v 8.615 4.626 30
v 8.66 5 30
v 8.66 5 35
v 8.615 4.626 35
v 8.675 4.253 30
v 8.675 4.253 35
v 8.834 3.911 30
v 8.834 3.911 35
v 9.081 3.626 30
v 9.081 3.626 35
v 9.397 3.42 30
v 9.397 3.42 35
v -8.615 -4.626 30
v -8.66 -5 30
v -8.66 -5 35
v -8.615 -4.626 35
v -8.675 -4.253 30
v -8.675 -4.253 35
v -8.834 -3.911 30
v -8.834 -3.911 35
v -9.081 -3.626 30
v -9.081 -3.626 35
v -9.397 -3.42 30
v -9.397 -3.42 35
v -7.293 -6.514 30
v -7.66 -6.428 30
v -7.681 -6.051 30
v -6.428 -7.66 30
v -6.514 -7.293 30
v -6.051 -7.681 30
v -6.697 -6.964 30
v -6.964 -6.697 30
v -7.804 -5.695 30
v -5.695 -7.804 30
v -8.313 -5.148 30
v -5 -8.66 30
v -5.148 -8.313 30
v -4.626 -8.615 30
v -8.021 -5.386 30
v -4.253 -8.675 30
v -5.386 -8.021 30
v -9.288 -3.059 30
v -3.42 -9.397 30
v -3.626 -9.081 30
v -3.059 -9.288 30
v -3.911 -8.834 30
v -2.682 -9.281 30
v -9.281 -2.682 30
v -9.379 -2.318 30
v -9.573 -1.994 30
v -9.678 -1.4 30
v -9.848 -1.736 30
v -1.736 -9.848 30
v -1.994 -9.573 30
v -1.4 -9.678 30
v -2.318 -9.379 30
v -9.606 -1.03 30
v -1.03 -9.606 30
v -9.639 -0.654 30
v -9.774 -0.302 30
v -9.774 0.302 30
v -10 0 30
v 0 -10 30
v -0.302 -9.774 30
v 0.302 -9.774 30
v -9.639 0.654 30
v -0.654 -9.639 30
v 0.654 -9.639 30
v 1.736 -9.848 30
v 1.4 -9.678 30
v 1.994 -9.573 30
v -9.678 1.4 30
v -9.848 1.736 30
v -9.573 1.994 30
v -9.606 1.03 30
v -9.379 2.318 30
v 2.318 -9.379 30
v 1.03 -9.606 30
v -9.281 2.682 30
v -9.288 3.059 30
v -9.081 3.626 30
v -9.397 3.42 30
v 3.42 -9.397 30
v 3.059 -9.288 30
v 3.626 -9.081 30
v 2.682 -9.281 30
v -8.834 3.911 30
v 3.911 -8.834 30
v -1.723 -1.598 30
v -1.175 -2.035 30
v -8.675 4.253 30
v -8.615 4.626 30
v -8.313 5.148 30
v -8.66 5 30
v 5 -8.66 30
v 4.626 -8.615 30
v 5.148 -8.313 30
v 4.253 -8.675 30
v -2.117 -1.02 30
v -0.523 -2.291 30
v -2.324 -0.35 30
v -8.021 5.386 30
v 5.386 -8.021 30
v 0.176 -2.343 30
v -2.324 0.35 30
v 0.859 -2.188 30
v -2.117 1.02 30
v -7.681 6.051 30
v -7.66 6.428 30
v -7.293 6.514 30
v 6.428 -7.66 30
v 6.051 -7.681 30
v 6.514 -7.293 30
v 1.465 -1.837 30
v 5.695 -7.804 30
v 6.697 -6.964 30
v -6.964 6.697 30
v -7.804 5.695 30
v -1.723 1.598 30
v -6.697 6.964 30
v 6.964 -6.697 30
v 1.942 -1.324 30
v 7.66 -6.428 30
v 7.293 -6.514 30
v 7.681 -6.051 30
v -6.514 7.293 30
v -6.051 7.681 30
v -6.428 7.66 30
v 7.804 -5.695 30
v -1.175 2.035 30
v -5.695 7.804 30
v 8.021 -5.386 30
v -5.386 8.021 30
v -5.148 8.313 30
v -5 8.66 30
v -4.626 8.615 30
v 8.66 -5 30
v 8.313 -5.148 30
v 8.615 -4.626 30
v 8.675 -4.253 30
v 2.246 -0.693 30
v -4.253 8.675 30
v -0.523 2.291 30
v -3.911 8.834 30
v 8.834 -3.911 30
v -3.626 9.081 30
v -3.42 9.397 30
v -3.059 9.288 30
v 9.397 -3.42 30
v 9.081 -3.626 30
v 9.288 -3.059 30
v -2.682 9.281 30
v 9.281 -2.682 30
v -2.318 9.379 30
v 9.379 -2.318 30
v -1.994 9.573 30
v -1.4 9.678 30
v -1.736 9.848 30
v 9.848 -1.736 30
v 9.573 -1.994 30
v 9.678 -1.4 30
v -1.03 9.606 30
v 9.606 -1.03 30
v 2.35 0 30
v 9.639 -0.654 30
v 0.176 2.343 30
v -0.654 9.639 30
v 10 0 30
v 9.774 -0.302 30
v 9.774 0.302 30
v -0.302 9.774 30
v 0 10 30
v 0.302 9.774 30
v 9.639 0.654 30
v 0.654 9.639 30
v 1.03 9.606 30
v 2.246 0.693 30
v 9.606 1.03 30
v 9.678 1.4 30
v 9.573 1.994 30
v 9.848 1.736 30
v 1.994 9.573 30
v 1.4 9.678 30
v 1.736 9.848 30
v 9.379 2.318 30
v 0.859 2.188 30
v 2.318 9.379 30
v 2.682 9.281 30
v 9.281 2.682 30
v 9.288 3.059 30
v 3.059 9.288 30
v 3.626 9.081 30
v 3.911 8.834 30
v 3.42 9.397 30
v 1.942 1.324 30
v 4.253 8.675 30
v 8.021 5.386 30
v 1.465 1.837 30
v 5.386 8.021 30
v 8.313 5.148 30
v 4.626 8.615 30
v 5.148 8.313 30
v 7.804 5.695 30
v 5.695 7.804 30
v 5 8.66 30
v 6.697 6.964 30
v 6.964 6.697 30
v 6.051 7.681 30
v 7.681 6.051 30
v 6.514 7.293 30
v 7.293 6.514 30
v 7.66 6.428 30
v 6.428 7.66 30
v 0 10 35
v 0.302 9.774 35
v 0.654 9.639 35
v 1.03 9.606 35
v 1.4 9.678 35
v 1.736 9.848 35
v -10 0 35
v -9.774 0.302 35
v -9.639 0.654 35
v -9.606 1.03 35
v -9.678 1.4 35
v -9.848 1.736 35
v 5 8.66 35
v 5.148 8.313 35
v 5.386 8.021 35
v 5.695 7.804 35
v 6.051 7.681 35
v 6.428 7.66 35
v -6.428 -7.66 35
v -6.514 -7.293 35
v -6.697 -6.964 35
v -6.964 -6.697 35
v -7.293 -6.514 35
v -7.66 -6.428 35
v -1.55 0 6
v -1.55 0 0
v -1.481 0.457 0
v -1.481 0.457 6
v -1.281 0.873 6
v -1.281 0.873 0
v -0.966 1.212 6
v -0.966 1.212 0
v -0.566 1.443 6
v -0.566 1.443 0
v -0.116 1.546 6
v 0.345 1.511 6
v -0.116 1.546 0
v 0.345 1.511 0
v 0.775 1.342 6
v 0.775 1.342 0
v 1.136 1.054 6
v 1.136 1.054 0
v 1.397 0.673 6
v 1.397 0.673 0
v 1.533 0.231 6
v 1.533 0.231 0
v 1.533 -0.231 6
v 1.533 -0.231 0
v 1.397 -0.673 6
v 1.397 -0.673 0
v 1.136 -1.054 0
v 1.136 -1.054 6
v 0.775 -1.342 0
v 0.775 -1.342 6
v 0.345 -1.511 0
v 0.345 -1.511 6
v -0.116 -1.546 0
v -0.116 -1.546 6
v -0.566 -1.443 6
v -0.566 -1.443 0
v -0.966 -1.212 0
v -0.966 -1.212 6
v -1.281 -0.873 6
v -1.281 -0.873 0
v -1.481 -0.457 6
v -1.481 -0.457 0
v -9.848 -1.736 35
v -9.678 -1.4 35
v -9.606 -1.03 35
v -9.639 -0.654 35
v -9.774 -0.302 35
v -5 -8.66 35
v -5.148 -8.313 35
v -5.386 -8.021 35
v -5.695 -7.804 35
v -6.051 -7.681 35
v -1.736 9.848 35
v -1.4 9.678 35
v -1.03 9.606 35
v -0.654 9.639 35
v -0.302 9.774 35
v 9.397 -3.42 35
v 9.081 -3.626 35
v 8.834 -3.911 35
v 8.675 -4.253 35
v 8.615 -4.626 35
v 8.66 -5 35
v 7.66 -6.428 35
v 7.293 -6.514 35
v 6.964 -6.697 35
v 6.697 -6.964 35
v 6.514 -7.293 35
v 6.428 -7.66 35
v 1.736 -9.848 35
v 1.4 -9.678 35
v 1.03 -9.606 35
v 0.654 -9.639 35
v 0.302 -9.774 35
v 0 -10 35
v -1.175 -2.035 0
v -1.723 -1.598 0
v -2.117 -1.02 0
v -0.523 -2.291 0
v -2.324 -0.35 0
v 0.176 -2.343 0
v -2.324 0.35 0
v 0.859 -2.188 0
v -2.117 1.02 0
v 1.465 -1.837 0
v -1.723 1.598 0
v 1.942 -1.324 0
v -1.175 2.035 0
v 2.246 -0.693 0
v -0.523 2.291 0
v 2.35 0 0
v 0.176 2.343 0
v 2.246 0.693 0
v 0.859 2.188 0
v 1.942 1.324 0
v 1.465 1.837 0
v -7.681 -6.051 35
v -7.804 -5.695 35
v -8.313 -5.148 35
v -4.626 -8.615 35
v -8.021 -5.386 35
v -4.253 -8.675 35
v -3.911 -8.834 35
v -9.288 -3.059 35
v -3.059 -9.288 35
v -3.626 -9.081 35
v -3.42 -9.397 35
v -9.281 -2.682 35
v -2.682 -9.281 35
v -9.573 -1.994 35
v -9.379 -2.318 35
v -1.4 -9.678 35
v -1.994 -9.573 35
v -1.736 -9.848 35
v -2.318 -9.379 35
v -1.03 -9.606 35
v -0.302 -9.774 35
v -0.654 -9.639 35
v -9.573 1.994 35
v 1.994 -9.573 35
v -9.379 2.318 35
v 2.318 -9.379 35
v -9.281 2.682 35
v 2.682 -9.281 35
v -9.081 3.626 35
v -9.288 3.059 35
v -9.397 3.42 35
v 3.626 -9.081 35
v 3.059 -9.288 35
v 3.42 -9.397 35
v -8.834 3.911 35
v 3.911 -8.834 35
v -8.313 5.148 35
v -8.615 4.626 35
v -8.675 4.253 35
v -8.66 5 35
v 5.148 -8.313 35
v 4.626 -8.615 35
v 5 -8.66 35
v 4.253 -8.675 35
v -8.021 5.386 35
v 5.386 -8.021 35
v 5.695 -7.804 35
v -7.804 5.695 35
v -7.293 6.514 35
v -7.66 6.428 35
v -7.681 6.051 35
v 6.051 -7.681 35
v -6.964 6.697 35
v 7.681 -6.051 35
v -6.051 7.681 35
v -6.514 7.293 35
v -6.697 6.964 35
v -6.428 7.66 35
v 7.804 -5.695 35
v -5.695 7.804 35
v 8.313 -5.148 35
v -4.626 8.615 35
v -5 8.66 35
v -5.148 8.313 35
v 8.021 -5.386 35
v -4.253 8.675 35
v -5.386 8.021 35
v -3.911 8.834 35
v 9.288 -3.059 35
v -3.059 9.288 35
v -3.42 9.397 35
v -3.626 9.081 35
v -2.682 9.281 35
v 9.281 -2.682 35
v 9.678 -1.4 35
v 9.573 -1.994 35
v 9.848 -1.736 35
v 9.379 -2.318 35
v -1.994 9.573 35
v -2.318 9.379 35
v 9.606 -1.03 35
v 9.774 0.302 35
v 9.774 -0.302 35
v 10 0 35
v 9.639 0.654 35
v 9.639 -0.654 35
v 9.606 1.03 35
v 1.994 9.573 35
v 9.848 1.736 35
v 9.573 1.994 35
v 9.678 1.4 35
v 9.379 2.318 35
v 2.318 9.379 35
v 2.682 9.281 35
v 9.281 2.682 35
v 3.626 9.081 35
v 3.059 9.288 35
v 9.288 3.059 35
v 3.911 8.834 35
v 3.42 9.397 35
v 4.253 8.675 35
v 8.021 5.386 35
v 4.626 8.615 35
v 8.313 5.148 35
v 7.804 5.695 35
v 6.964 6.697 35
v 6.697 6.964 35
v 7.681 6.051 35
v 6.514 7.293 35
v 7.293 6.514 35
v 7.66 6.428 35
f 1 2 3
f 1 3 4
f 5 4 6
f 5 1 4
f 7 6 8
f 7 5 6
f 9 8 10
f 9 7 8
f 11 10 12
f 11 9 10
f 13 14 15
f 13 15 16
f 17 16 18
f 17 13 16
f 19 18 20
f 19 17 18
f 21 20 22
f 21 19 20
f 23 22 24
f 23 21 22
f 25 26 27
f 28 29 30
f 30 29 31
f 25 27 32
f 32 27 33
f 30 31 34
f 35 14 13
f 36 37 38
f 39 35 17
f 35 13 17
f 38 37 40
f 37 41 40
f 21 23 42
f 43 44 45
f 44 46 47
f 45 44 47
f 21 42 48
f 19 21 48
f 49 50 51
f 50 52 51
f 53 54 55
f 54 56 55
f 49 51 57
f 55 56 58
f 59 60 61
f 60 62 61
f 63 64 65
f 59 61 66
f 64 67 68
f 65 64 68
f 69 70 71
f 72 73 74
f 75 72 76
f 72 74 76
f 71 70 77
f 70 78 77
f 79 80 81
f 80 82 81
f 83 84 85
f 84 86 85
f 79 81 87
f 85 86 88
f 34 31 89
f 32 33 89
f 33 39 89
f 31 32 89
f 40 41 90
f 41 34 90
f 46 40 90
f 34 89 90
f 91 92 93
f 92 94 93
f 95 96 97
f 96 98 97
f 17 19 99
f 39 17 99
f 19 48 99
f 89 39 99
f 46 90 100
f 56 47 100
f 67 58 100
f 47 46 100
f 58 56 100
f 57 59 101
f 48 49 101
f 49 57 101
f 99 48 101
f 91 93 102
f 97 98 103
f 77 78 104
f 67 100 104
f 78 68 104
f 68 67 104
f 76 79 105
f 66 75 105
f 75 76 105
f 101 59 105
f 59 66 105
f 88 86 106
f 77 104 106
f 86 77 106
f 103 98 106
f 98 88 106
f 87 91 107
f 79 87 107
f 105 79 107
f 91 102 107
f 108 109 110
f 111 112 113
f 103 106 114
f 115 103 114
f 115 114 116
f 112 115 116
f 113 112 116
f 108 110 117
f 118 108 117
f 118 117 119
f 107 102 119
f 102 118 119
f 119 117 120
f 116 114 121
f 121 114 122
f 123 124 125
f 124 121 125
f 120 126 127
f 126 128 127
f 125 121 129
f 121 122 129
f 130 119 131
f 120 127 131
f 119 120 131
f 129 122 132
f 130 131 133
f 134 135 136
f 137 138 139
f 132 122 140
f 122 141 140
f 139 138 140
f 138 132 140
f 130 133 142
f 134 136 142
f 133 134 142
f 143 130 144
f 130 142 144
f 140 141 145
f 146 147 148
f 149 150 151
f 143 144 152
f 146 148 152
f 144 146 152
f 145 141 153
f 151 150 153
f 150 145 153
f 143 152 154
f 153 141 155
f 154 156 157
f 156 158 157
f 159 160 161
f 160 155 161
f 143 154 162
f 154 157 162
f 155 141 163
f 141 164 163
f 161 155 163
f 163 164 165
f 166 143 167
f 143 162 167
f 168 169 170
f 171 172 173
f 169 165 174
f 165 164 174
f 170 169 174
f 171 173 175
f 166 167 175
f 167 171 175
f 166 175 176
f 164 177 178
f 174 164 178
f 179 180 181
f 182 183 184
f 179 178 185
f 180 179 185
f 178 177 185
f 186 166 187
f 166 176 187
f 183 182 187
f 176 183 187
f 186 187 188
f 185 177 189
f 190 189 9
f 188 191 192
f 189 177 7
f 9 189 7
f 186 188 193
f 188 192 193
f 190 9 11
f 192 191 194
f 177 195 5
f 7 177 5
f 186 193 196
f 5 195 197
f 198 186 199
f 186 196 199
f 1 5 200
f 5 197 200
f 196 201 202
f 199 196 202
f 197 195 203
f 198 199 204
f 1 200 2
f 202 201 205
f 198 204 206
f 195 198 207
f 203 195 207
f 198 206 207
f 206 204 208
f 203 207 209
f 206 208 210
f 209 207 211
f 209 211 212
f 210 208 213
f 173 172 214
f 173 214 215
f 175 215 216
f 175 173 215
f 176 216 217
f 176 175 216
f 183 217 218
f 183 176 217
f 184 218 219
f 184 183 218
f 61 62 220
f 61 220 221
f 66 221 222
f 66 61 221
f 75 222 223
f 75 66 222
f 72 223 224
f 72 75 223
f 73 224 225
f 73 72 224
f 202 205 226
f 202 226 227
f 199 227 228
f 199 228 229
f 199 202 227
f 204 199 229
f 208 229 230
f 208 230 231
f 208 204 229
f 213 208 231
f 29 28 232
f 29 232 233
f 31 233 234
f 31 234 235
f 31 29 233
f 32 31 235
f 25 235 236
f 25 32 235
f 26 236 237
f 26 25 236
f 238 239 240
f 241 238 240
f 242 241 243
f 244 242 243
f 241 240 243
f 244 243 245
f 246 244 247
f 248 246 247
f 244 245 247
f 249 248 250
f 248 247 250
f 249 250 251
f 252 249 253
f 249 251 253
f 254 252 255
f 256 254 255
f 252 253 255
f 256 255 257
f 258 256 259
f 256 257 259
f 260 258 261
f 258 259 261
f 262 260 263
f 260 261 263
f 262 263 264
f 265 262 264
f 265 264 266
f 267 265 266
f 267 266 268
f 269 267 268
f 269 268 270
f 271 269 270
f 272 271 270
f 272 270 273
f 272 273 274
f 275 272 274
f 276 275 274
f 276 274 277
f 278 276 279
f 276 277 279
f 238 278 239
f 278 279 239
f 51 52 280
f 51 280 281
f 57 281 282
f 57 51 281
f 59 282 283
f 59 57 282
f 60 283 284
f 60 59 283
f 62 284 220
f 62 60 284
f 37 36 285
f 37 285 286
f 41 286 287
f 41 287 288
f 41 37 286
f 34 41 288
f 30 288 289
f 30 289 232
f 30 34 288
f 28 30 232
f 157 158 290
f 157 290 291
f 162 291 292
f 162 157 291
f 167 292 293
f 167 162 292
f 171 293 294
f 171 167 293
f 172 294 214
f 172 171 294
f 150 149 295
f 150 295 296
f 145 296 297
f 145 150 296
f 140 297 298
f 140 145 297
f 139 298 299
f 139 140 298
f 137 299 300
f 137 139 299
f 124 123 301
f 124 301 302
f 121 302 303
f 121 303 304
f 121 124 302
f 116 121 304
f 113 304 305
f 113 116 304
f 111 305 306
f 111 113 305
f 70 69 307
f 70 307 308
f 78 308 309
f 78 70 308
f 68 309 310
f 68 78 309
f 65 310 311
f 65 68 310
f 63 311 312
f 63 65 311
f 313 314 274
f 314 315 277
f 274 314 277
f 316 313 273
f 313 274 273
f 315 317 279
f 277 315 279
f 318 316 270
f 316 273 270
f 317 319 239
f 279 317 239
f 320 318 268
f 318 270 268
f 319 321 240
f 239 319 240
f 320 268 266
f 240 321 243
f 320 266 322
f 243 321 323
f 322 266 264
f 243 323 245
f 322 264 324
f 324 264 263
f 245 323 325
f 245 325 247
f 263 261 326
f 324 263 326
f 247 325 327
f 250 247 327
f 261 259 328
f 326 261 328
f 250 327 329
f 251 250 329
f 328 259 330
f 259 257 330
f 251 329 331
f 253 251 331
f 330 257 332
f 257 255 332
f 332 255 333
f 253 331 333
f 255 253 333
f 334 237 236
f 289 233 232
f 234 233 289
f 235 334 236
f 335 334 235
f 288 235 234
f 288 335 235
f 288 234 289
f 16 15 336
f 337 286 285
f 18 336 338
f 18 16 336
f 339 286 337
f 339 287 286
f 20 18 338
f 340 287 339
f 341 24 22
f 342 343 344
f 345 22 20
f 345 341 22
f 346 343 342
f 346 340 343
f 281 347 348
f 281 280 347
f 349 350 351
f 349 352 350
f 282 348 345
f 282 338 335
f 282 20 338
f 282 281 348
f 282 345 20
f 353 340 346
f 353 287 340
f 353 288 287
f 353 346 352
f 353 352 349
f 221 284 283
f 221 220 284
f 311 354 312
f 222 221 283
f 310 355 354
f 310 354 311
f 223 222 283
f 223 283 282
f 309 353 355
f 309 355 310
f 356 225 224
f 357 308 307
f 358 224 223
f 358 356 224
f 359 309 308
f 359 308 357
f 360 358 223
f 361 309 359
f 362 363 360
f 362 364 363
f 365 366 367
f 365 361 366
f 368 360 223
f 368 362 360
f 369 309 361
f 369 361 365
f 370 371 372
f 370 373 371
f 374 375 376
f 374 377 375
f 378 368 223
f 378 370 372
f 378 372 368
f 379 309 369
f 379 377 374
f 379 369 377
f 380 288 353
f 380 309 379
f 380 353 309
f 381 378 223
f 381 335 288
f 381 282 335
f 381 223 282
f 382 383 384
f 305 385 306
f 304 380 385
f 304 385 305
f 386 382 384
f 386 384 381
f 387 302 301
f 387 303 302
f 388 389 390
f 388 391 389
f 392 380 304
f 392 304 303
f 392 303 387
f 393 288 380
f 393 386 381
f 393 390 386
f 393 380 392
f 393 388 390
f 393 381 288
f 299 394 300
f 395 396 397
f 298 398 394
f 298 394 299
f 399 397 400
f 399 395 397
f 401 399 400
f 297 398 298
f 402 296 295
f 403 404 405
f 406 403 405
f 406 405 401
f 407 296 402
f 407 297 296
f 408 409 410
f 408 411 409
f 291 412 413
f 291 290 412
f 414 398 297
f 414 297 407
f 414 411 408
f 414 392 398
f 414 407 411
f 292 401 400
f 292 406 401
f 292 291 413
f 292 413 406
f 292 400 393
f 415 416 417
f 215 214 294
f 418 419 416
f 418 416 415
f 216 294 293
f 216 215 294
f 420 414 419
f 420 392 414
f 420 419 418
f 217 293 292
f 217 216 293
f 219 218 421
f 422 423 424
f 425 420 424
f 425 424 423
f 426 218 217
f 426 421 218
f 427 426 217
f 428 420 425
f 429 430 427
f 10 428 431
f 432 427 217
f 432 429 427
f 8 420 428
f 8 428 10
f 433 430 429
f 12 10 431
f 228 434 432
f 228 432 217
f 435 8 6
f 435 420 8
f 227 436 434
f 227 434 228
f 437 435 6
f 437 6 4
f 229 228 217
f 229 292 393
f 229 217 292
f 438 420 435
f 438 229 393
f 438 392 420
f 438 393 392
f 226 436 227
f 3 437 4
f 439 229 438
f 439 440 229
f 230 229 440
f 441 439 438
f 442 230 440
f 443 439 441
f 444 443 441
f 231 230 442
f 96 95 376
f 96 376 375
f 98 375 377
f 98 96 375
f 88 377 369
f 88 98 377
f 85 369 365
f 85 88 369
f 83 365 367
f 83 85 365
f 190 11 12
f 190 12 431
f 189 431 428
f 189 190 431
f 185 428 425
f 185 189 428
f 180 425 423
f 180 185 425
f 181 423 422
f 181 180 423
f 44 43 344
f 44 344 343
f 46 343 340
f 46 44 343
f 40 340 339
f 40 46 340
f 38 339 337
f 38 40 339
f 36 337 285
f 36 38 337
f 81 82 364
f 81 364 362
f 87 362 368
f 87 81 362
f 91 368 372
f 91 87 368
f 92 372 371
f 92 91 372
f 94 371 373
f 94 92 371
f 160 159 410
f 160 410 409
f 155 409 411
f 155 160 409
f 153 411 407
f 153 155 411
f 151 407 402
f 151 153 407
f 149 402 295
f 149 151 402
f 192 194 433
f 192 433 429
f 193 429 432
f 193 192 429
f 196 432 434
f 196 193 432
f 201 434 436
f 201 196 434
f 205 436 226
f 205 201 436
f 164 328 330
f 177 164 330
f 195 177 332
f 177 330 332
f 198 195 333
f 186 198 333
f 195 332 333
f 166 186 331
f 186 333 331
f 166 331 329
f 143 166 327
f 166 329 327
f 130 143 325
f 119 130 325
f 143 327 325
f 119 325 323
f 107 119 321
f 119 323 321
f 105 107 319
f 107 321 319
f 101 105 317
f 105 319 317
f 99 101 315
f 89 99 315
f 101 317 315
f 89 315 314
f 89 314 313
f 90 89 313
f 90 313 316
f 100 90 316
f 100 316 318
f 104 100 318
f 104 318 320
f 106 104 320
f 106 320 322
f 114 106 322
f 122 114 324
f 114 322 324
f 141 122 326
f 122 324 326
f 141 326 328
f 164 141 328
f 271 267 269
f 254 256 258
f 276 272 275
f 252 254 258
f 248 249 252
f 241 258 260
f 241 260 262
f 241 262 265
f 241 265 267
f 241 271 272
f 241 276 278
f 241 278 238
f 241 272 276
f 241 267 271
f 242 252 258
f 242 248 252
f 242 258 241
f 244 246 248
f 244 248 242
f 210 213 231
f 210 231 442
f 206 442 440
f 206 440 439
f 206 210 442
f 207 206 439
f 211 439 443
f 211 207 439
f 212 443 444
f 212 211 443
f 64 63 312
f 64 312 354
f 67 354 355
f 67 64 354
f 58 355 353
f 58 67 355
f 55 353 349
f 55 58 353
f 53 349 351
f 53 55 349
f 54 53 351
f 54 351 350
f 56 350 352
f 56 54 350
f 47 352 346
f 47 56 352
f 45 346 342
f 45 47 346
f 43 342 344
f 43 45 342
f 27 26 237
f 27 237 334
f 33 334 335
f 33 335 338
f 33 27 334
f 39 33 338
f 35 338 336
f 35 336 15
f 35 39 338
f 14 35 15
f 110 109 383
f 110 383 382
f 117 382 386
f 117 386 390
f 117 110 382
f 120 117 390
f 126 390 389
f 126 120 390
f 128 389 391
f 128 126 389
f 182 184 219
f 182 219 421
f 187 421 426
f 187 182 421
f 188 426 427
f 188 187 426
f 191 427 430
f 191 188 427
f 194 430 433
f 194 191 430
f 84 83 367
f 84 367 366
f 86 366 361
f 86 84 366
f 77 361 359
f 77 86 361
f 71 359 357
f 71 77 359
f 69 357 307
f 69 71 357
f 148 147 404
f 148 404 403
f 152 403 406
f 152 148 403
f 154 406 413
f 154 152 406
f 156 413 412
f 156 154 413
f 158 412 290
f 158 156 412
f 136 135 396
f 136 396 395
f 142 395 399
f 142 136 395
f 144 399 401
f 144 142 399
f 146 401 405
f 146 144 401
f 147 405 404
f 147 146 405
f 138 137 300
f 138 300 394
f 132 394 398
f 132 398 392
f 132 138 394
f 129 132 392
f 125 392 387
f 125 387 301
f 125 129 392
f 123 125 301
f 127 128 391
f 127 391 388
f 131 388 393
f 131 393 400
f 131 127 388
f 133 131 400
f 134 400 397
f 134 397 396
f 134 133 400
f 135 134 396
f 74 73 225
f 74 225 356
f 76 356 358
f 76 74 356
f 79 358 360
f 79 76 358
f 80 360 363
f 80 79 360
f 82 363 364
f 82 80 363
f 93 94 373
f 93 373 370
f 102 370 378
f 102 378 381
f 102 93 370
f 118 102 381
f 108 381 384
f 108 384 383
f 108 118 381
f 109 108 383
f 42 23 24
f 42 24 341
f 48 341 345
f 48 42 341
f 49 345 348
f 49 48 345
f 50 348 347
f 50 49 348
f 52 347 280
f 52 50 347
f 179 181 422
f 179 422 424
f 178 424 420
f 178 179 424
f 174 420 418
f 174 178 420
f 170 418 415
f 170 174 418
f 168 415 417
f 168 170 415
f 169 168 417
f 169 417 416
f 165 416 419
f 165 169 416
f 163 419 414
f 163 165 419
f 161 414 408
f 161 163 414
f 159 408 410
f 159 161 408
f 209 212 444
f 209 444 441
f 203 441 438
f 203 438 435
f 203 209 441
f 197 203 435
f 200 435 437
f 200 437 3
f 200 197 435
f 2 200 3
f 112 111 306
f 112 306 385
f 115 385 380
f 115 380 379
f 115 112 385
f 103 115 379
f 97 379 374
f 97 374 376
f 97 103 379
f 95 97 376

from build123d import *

# Parameters (mm, degrees)
SKIZZE1_R                       = 2.35
AUFSATZ_LINEAR_AUSTRAGEN1_DEPTH = 30
SKIZZE4_R                       = 1.55
SCHNITT_LINEAR_AUSTRAGEN2_DEPTH = 6
SKIZZE5_R                       = 10
AUFSATZ_LINEAR_AUSTRAGEN3_DEPTH = 5
SCHNITT_LINEAR_START            = -5
SKIZZE6_R                       = 12.190209649
SCHNITT_LINEAR_AUSTRAGEN3_DEPTH = 5


with BuildPart() as part:
    # Skizze1 → Aufsatz-Linear austragen1 (new body)
    with BuildSketch(Plane.XY):
        Circle(SKIZZE1_R)
    extrude(amount=AUFSATZ_LINEAR_AUSTRAGEN1_DEPTH)

    # Skizze4 → Schnitt-Linear austragen2 (cut)
    with BuildSketch(Plane(origin=(0, 0, 0), x_dir=(-1, 0, 0), z_dir=(0, 0, -1))):
        Circle(SKIZZE4_R)
    extrude(amount=-SCHNITT_LINEAR_AUSTRAGEN2_DEPTH, mode=Mode.SUBTRACT)

    # Skizze5 → Aufsatz-Linear austragen3 (add)
    with BuildSketch(Plane.XY.offset(30)):
        Circle(SKIZZE5_R)
    extrude(amount=AUFSATZ_LINEAR_AUSTRAGEN3_DEPTH)

    # Skizze6 → Schnitt-Linear austragen3 (cut)
    with BuildSketch(Plane.XY.offset(35).offset(SCHNITT_LINEAR_START)):
        Circle(SKIZZE6_R)
        with BuildLine():
            ThreePointArc((0, 10), (0.840722593, 9.609503215), (1.736481777, 9.84807753))
            ThreePointArc((1.736481777, 9.84807753), (2.49662285, 9.317523323), (3.420201433, 9.396926208))
            ThreePointArc((3.420201433, 9.396926208), (4.076664484, 8.742435199), (5, 8.660254038))
            ThreePointArc((5, 8.660254038), (5.532838731, 7.901712605), (6.427876097, 7.660444431))
            ThreePointArc((6.427876097, 7.660444431), (6.820900473, 6.820900473), (7.660444431, 6.427876097))
            ThreePointArc((7.660444431, 6.427876097), (7.901712605, 5.532838731), (8.660254038, 5))
            ThreePointArc((8.660254038, 5), (8.742435199, 4.076664484), (9.396926208, 3.420201433))
            ThreePointArc((9.396926208, 3.420201433), (9.317523323, 2.49662285), (9.84807753, 1.736481777))
            ThreePointArc((9.84807753, 1.736481777), (9.609503215, 0.840722593), (10, 0))
            ThreePointArc((10, 0), (9.609503215, -0.840722593), (9.84807753, -1.736481777))
            ThreePointArc((9.84807753, -1.736481777), (9.317523323, -2.49662285), (9.396926208, -3.420201433))
            ThreePointArc((9.396926208, -3.420201433), (8.742435199, -4.076664484), (8.660254038, -5))
            ThreePointArc((8.660254038, -5), (7.901712605, -5.532838731), (7.660444431, -6.427876097))
            ThreePointArc((7.660444431, -6.427876097), (6.820900473, -6.820900473), (6.427876097, -7.660444431))
            ThreePointArc((6.427876097, -7.660444431), (5.532838731, -7.901712605), (5, -8.660254038))
            ThreePointArc((5, -8.660254038), (4.076664484, -8.742435199), (3.420201433, -9.396926208))
            ThreePointArc((3.420201433, -9.396926208), (2.49662285, -9.317523323), (1.736481777, -9.84807753))
            ThreePointArc((1.736481777, -9.84807753), (0.840722593, -9.609503215), (0, -10))
            ThreePointArc((0, -10), (-0.840722593, -9.609503215), (-1.736481777, -9.84807753))
            ThreePointArc((-1.736481777, -9.84807753), (-2.49662285, -9.317523323), (-3.420201433, -9.396926208))
            ThreePointArc((-3.420201433, -9.396926208), (-4.076664484, -8.742435199), (-5, -8.660254038))
            ThreePointArc((-5, -8.660254038), (-5.532838731, -7.901712605), (-6.427876097, -7.660444431))
            ThreePointArc((-6.427876097, -7.660444431), (-6.820900473, -6.820900473), (-7.660444431, -6.427876097))
            ThreePointArc((-7.660444431, -6.427876097), (-7.901712605, -5.532838731), (-8.660254038, -5))
            ThreePointArc((-8.660254038, -5), (-8.742435199, -4.076664484), (-9.396926208, -3.420201433))
            ThreePointArc((-9.396926208, -3.420201433), (-9.317523323, -2.49662285), (-9.84807753, -1.736481777))
            ThreePointArc((-9.84807753, -1.736481777), (-9.609503215, -0.840722593), (-10, 0))
            ThreePointArc((-10, 0), (-9.609503215, 0.840722593), (-9.84807753, 1.736481777))
            ThreePointArc((-9.84807753, 1.736481777), (-9.317523323, 2.49662285), (-9.396926208, 3.420201433))
            ThreePointArc((-9.396926208, 3.420201433), (-8.742435199, 4.076664484), (-8.660254038, 5))
            ThreePointArc((-8.660254038, 5), (-7.901712605, 5.532838731), (-7.660444431, 6.427876097))
            ThreePointArc((-7.660444431, 6.427876097), (-6.820900473, 6.820900473), (-6.427876097, 7.660444431))
            ThreePointArc((-6.427876097, 7.660444431), (-5.532838731, 7.901712605), (-5, 8.660254038))
            ThreePointArc((-5, 8.660254038), (-4.076664484, 8.742435199), (-3.420201433, 9.396926208))
            ThreePointArc((-3.420201433, 9.396926208), (-2.49662285, 9.317523323), (-1.736481777, 9.84807753))
            ThreePointArc((-1.736481777, 9.84807753), (-0.840722593, 9.609503215), (0, 10))
        make_face(mode=Mode.SUBTRACT)
    extrude(amount=SCHNITT_LINEAR_AUSTRAGEN3_DEPTH, mode=Mode.SUBTRACT)


solid = part.part
